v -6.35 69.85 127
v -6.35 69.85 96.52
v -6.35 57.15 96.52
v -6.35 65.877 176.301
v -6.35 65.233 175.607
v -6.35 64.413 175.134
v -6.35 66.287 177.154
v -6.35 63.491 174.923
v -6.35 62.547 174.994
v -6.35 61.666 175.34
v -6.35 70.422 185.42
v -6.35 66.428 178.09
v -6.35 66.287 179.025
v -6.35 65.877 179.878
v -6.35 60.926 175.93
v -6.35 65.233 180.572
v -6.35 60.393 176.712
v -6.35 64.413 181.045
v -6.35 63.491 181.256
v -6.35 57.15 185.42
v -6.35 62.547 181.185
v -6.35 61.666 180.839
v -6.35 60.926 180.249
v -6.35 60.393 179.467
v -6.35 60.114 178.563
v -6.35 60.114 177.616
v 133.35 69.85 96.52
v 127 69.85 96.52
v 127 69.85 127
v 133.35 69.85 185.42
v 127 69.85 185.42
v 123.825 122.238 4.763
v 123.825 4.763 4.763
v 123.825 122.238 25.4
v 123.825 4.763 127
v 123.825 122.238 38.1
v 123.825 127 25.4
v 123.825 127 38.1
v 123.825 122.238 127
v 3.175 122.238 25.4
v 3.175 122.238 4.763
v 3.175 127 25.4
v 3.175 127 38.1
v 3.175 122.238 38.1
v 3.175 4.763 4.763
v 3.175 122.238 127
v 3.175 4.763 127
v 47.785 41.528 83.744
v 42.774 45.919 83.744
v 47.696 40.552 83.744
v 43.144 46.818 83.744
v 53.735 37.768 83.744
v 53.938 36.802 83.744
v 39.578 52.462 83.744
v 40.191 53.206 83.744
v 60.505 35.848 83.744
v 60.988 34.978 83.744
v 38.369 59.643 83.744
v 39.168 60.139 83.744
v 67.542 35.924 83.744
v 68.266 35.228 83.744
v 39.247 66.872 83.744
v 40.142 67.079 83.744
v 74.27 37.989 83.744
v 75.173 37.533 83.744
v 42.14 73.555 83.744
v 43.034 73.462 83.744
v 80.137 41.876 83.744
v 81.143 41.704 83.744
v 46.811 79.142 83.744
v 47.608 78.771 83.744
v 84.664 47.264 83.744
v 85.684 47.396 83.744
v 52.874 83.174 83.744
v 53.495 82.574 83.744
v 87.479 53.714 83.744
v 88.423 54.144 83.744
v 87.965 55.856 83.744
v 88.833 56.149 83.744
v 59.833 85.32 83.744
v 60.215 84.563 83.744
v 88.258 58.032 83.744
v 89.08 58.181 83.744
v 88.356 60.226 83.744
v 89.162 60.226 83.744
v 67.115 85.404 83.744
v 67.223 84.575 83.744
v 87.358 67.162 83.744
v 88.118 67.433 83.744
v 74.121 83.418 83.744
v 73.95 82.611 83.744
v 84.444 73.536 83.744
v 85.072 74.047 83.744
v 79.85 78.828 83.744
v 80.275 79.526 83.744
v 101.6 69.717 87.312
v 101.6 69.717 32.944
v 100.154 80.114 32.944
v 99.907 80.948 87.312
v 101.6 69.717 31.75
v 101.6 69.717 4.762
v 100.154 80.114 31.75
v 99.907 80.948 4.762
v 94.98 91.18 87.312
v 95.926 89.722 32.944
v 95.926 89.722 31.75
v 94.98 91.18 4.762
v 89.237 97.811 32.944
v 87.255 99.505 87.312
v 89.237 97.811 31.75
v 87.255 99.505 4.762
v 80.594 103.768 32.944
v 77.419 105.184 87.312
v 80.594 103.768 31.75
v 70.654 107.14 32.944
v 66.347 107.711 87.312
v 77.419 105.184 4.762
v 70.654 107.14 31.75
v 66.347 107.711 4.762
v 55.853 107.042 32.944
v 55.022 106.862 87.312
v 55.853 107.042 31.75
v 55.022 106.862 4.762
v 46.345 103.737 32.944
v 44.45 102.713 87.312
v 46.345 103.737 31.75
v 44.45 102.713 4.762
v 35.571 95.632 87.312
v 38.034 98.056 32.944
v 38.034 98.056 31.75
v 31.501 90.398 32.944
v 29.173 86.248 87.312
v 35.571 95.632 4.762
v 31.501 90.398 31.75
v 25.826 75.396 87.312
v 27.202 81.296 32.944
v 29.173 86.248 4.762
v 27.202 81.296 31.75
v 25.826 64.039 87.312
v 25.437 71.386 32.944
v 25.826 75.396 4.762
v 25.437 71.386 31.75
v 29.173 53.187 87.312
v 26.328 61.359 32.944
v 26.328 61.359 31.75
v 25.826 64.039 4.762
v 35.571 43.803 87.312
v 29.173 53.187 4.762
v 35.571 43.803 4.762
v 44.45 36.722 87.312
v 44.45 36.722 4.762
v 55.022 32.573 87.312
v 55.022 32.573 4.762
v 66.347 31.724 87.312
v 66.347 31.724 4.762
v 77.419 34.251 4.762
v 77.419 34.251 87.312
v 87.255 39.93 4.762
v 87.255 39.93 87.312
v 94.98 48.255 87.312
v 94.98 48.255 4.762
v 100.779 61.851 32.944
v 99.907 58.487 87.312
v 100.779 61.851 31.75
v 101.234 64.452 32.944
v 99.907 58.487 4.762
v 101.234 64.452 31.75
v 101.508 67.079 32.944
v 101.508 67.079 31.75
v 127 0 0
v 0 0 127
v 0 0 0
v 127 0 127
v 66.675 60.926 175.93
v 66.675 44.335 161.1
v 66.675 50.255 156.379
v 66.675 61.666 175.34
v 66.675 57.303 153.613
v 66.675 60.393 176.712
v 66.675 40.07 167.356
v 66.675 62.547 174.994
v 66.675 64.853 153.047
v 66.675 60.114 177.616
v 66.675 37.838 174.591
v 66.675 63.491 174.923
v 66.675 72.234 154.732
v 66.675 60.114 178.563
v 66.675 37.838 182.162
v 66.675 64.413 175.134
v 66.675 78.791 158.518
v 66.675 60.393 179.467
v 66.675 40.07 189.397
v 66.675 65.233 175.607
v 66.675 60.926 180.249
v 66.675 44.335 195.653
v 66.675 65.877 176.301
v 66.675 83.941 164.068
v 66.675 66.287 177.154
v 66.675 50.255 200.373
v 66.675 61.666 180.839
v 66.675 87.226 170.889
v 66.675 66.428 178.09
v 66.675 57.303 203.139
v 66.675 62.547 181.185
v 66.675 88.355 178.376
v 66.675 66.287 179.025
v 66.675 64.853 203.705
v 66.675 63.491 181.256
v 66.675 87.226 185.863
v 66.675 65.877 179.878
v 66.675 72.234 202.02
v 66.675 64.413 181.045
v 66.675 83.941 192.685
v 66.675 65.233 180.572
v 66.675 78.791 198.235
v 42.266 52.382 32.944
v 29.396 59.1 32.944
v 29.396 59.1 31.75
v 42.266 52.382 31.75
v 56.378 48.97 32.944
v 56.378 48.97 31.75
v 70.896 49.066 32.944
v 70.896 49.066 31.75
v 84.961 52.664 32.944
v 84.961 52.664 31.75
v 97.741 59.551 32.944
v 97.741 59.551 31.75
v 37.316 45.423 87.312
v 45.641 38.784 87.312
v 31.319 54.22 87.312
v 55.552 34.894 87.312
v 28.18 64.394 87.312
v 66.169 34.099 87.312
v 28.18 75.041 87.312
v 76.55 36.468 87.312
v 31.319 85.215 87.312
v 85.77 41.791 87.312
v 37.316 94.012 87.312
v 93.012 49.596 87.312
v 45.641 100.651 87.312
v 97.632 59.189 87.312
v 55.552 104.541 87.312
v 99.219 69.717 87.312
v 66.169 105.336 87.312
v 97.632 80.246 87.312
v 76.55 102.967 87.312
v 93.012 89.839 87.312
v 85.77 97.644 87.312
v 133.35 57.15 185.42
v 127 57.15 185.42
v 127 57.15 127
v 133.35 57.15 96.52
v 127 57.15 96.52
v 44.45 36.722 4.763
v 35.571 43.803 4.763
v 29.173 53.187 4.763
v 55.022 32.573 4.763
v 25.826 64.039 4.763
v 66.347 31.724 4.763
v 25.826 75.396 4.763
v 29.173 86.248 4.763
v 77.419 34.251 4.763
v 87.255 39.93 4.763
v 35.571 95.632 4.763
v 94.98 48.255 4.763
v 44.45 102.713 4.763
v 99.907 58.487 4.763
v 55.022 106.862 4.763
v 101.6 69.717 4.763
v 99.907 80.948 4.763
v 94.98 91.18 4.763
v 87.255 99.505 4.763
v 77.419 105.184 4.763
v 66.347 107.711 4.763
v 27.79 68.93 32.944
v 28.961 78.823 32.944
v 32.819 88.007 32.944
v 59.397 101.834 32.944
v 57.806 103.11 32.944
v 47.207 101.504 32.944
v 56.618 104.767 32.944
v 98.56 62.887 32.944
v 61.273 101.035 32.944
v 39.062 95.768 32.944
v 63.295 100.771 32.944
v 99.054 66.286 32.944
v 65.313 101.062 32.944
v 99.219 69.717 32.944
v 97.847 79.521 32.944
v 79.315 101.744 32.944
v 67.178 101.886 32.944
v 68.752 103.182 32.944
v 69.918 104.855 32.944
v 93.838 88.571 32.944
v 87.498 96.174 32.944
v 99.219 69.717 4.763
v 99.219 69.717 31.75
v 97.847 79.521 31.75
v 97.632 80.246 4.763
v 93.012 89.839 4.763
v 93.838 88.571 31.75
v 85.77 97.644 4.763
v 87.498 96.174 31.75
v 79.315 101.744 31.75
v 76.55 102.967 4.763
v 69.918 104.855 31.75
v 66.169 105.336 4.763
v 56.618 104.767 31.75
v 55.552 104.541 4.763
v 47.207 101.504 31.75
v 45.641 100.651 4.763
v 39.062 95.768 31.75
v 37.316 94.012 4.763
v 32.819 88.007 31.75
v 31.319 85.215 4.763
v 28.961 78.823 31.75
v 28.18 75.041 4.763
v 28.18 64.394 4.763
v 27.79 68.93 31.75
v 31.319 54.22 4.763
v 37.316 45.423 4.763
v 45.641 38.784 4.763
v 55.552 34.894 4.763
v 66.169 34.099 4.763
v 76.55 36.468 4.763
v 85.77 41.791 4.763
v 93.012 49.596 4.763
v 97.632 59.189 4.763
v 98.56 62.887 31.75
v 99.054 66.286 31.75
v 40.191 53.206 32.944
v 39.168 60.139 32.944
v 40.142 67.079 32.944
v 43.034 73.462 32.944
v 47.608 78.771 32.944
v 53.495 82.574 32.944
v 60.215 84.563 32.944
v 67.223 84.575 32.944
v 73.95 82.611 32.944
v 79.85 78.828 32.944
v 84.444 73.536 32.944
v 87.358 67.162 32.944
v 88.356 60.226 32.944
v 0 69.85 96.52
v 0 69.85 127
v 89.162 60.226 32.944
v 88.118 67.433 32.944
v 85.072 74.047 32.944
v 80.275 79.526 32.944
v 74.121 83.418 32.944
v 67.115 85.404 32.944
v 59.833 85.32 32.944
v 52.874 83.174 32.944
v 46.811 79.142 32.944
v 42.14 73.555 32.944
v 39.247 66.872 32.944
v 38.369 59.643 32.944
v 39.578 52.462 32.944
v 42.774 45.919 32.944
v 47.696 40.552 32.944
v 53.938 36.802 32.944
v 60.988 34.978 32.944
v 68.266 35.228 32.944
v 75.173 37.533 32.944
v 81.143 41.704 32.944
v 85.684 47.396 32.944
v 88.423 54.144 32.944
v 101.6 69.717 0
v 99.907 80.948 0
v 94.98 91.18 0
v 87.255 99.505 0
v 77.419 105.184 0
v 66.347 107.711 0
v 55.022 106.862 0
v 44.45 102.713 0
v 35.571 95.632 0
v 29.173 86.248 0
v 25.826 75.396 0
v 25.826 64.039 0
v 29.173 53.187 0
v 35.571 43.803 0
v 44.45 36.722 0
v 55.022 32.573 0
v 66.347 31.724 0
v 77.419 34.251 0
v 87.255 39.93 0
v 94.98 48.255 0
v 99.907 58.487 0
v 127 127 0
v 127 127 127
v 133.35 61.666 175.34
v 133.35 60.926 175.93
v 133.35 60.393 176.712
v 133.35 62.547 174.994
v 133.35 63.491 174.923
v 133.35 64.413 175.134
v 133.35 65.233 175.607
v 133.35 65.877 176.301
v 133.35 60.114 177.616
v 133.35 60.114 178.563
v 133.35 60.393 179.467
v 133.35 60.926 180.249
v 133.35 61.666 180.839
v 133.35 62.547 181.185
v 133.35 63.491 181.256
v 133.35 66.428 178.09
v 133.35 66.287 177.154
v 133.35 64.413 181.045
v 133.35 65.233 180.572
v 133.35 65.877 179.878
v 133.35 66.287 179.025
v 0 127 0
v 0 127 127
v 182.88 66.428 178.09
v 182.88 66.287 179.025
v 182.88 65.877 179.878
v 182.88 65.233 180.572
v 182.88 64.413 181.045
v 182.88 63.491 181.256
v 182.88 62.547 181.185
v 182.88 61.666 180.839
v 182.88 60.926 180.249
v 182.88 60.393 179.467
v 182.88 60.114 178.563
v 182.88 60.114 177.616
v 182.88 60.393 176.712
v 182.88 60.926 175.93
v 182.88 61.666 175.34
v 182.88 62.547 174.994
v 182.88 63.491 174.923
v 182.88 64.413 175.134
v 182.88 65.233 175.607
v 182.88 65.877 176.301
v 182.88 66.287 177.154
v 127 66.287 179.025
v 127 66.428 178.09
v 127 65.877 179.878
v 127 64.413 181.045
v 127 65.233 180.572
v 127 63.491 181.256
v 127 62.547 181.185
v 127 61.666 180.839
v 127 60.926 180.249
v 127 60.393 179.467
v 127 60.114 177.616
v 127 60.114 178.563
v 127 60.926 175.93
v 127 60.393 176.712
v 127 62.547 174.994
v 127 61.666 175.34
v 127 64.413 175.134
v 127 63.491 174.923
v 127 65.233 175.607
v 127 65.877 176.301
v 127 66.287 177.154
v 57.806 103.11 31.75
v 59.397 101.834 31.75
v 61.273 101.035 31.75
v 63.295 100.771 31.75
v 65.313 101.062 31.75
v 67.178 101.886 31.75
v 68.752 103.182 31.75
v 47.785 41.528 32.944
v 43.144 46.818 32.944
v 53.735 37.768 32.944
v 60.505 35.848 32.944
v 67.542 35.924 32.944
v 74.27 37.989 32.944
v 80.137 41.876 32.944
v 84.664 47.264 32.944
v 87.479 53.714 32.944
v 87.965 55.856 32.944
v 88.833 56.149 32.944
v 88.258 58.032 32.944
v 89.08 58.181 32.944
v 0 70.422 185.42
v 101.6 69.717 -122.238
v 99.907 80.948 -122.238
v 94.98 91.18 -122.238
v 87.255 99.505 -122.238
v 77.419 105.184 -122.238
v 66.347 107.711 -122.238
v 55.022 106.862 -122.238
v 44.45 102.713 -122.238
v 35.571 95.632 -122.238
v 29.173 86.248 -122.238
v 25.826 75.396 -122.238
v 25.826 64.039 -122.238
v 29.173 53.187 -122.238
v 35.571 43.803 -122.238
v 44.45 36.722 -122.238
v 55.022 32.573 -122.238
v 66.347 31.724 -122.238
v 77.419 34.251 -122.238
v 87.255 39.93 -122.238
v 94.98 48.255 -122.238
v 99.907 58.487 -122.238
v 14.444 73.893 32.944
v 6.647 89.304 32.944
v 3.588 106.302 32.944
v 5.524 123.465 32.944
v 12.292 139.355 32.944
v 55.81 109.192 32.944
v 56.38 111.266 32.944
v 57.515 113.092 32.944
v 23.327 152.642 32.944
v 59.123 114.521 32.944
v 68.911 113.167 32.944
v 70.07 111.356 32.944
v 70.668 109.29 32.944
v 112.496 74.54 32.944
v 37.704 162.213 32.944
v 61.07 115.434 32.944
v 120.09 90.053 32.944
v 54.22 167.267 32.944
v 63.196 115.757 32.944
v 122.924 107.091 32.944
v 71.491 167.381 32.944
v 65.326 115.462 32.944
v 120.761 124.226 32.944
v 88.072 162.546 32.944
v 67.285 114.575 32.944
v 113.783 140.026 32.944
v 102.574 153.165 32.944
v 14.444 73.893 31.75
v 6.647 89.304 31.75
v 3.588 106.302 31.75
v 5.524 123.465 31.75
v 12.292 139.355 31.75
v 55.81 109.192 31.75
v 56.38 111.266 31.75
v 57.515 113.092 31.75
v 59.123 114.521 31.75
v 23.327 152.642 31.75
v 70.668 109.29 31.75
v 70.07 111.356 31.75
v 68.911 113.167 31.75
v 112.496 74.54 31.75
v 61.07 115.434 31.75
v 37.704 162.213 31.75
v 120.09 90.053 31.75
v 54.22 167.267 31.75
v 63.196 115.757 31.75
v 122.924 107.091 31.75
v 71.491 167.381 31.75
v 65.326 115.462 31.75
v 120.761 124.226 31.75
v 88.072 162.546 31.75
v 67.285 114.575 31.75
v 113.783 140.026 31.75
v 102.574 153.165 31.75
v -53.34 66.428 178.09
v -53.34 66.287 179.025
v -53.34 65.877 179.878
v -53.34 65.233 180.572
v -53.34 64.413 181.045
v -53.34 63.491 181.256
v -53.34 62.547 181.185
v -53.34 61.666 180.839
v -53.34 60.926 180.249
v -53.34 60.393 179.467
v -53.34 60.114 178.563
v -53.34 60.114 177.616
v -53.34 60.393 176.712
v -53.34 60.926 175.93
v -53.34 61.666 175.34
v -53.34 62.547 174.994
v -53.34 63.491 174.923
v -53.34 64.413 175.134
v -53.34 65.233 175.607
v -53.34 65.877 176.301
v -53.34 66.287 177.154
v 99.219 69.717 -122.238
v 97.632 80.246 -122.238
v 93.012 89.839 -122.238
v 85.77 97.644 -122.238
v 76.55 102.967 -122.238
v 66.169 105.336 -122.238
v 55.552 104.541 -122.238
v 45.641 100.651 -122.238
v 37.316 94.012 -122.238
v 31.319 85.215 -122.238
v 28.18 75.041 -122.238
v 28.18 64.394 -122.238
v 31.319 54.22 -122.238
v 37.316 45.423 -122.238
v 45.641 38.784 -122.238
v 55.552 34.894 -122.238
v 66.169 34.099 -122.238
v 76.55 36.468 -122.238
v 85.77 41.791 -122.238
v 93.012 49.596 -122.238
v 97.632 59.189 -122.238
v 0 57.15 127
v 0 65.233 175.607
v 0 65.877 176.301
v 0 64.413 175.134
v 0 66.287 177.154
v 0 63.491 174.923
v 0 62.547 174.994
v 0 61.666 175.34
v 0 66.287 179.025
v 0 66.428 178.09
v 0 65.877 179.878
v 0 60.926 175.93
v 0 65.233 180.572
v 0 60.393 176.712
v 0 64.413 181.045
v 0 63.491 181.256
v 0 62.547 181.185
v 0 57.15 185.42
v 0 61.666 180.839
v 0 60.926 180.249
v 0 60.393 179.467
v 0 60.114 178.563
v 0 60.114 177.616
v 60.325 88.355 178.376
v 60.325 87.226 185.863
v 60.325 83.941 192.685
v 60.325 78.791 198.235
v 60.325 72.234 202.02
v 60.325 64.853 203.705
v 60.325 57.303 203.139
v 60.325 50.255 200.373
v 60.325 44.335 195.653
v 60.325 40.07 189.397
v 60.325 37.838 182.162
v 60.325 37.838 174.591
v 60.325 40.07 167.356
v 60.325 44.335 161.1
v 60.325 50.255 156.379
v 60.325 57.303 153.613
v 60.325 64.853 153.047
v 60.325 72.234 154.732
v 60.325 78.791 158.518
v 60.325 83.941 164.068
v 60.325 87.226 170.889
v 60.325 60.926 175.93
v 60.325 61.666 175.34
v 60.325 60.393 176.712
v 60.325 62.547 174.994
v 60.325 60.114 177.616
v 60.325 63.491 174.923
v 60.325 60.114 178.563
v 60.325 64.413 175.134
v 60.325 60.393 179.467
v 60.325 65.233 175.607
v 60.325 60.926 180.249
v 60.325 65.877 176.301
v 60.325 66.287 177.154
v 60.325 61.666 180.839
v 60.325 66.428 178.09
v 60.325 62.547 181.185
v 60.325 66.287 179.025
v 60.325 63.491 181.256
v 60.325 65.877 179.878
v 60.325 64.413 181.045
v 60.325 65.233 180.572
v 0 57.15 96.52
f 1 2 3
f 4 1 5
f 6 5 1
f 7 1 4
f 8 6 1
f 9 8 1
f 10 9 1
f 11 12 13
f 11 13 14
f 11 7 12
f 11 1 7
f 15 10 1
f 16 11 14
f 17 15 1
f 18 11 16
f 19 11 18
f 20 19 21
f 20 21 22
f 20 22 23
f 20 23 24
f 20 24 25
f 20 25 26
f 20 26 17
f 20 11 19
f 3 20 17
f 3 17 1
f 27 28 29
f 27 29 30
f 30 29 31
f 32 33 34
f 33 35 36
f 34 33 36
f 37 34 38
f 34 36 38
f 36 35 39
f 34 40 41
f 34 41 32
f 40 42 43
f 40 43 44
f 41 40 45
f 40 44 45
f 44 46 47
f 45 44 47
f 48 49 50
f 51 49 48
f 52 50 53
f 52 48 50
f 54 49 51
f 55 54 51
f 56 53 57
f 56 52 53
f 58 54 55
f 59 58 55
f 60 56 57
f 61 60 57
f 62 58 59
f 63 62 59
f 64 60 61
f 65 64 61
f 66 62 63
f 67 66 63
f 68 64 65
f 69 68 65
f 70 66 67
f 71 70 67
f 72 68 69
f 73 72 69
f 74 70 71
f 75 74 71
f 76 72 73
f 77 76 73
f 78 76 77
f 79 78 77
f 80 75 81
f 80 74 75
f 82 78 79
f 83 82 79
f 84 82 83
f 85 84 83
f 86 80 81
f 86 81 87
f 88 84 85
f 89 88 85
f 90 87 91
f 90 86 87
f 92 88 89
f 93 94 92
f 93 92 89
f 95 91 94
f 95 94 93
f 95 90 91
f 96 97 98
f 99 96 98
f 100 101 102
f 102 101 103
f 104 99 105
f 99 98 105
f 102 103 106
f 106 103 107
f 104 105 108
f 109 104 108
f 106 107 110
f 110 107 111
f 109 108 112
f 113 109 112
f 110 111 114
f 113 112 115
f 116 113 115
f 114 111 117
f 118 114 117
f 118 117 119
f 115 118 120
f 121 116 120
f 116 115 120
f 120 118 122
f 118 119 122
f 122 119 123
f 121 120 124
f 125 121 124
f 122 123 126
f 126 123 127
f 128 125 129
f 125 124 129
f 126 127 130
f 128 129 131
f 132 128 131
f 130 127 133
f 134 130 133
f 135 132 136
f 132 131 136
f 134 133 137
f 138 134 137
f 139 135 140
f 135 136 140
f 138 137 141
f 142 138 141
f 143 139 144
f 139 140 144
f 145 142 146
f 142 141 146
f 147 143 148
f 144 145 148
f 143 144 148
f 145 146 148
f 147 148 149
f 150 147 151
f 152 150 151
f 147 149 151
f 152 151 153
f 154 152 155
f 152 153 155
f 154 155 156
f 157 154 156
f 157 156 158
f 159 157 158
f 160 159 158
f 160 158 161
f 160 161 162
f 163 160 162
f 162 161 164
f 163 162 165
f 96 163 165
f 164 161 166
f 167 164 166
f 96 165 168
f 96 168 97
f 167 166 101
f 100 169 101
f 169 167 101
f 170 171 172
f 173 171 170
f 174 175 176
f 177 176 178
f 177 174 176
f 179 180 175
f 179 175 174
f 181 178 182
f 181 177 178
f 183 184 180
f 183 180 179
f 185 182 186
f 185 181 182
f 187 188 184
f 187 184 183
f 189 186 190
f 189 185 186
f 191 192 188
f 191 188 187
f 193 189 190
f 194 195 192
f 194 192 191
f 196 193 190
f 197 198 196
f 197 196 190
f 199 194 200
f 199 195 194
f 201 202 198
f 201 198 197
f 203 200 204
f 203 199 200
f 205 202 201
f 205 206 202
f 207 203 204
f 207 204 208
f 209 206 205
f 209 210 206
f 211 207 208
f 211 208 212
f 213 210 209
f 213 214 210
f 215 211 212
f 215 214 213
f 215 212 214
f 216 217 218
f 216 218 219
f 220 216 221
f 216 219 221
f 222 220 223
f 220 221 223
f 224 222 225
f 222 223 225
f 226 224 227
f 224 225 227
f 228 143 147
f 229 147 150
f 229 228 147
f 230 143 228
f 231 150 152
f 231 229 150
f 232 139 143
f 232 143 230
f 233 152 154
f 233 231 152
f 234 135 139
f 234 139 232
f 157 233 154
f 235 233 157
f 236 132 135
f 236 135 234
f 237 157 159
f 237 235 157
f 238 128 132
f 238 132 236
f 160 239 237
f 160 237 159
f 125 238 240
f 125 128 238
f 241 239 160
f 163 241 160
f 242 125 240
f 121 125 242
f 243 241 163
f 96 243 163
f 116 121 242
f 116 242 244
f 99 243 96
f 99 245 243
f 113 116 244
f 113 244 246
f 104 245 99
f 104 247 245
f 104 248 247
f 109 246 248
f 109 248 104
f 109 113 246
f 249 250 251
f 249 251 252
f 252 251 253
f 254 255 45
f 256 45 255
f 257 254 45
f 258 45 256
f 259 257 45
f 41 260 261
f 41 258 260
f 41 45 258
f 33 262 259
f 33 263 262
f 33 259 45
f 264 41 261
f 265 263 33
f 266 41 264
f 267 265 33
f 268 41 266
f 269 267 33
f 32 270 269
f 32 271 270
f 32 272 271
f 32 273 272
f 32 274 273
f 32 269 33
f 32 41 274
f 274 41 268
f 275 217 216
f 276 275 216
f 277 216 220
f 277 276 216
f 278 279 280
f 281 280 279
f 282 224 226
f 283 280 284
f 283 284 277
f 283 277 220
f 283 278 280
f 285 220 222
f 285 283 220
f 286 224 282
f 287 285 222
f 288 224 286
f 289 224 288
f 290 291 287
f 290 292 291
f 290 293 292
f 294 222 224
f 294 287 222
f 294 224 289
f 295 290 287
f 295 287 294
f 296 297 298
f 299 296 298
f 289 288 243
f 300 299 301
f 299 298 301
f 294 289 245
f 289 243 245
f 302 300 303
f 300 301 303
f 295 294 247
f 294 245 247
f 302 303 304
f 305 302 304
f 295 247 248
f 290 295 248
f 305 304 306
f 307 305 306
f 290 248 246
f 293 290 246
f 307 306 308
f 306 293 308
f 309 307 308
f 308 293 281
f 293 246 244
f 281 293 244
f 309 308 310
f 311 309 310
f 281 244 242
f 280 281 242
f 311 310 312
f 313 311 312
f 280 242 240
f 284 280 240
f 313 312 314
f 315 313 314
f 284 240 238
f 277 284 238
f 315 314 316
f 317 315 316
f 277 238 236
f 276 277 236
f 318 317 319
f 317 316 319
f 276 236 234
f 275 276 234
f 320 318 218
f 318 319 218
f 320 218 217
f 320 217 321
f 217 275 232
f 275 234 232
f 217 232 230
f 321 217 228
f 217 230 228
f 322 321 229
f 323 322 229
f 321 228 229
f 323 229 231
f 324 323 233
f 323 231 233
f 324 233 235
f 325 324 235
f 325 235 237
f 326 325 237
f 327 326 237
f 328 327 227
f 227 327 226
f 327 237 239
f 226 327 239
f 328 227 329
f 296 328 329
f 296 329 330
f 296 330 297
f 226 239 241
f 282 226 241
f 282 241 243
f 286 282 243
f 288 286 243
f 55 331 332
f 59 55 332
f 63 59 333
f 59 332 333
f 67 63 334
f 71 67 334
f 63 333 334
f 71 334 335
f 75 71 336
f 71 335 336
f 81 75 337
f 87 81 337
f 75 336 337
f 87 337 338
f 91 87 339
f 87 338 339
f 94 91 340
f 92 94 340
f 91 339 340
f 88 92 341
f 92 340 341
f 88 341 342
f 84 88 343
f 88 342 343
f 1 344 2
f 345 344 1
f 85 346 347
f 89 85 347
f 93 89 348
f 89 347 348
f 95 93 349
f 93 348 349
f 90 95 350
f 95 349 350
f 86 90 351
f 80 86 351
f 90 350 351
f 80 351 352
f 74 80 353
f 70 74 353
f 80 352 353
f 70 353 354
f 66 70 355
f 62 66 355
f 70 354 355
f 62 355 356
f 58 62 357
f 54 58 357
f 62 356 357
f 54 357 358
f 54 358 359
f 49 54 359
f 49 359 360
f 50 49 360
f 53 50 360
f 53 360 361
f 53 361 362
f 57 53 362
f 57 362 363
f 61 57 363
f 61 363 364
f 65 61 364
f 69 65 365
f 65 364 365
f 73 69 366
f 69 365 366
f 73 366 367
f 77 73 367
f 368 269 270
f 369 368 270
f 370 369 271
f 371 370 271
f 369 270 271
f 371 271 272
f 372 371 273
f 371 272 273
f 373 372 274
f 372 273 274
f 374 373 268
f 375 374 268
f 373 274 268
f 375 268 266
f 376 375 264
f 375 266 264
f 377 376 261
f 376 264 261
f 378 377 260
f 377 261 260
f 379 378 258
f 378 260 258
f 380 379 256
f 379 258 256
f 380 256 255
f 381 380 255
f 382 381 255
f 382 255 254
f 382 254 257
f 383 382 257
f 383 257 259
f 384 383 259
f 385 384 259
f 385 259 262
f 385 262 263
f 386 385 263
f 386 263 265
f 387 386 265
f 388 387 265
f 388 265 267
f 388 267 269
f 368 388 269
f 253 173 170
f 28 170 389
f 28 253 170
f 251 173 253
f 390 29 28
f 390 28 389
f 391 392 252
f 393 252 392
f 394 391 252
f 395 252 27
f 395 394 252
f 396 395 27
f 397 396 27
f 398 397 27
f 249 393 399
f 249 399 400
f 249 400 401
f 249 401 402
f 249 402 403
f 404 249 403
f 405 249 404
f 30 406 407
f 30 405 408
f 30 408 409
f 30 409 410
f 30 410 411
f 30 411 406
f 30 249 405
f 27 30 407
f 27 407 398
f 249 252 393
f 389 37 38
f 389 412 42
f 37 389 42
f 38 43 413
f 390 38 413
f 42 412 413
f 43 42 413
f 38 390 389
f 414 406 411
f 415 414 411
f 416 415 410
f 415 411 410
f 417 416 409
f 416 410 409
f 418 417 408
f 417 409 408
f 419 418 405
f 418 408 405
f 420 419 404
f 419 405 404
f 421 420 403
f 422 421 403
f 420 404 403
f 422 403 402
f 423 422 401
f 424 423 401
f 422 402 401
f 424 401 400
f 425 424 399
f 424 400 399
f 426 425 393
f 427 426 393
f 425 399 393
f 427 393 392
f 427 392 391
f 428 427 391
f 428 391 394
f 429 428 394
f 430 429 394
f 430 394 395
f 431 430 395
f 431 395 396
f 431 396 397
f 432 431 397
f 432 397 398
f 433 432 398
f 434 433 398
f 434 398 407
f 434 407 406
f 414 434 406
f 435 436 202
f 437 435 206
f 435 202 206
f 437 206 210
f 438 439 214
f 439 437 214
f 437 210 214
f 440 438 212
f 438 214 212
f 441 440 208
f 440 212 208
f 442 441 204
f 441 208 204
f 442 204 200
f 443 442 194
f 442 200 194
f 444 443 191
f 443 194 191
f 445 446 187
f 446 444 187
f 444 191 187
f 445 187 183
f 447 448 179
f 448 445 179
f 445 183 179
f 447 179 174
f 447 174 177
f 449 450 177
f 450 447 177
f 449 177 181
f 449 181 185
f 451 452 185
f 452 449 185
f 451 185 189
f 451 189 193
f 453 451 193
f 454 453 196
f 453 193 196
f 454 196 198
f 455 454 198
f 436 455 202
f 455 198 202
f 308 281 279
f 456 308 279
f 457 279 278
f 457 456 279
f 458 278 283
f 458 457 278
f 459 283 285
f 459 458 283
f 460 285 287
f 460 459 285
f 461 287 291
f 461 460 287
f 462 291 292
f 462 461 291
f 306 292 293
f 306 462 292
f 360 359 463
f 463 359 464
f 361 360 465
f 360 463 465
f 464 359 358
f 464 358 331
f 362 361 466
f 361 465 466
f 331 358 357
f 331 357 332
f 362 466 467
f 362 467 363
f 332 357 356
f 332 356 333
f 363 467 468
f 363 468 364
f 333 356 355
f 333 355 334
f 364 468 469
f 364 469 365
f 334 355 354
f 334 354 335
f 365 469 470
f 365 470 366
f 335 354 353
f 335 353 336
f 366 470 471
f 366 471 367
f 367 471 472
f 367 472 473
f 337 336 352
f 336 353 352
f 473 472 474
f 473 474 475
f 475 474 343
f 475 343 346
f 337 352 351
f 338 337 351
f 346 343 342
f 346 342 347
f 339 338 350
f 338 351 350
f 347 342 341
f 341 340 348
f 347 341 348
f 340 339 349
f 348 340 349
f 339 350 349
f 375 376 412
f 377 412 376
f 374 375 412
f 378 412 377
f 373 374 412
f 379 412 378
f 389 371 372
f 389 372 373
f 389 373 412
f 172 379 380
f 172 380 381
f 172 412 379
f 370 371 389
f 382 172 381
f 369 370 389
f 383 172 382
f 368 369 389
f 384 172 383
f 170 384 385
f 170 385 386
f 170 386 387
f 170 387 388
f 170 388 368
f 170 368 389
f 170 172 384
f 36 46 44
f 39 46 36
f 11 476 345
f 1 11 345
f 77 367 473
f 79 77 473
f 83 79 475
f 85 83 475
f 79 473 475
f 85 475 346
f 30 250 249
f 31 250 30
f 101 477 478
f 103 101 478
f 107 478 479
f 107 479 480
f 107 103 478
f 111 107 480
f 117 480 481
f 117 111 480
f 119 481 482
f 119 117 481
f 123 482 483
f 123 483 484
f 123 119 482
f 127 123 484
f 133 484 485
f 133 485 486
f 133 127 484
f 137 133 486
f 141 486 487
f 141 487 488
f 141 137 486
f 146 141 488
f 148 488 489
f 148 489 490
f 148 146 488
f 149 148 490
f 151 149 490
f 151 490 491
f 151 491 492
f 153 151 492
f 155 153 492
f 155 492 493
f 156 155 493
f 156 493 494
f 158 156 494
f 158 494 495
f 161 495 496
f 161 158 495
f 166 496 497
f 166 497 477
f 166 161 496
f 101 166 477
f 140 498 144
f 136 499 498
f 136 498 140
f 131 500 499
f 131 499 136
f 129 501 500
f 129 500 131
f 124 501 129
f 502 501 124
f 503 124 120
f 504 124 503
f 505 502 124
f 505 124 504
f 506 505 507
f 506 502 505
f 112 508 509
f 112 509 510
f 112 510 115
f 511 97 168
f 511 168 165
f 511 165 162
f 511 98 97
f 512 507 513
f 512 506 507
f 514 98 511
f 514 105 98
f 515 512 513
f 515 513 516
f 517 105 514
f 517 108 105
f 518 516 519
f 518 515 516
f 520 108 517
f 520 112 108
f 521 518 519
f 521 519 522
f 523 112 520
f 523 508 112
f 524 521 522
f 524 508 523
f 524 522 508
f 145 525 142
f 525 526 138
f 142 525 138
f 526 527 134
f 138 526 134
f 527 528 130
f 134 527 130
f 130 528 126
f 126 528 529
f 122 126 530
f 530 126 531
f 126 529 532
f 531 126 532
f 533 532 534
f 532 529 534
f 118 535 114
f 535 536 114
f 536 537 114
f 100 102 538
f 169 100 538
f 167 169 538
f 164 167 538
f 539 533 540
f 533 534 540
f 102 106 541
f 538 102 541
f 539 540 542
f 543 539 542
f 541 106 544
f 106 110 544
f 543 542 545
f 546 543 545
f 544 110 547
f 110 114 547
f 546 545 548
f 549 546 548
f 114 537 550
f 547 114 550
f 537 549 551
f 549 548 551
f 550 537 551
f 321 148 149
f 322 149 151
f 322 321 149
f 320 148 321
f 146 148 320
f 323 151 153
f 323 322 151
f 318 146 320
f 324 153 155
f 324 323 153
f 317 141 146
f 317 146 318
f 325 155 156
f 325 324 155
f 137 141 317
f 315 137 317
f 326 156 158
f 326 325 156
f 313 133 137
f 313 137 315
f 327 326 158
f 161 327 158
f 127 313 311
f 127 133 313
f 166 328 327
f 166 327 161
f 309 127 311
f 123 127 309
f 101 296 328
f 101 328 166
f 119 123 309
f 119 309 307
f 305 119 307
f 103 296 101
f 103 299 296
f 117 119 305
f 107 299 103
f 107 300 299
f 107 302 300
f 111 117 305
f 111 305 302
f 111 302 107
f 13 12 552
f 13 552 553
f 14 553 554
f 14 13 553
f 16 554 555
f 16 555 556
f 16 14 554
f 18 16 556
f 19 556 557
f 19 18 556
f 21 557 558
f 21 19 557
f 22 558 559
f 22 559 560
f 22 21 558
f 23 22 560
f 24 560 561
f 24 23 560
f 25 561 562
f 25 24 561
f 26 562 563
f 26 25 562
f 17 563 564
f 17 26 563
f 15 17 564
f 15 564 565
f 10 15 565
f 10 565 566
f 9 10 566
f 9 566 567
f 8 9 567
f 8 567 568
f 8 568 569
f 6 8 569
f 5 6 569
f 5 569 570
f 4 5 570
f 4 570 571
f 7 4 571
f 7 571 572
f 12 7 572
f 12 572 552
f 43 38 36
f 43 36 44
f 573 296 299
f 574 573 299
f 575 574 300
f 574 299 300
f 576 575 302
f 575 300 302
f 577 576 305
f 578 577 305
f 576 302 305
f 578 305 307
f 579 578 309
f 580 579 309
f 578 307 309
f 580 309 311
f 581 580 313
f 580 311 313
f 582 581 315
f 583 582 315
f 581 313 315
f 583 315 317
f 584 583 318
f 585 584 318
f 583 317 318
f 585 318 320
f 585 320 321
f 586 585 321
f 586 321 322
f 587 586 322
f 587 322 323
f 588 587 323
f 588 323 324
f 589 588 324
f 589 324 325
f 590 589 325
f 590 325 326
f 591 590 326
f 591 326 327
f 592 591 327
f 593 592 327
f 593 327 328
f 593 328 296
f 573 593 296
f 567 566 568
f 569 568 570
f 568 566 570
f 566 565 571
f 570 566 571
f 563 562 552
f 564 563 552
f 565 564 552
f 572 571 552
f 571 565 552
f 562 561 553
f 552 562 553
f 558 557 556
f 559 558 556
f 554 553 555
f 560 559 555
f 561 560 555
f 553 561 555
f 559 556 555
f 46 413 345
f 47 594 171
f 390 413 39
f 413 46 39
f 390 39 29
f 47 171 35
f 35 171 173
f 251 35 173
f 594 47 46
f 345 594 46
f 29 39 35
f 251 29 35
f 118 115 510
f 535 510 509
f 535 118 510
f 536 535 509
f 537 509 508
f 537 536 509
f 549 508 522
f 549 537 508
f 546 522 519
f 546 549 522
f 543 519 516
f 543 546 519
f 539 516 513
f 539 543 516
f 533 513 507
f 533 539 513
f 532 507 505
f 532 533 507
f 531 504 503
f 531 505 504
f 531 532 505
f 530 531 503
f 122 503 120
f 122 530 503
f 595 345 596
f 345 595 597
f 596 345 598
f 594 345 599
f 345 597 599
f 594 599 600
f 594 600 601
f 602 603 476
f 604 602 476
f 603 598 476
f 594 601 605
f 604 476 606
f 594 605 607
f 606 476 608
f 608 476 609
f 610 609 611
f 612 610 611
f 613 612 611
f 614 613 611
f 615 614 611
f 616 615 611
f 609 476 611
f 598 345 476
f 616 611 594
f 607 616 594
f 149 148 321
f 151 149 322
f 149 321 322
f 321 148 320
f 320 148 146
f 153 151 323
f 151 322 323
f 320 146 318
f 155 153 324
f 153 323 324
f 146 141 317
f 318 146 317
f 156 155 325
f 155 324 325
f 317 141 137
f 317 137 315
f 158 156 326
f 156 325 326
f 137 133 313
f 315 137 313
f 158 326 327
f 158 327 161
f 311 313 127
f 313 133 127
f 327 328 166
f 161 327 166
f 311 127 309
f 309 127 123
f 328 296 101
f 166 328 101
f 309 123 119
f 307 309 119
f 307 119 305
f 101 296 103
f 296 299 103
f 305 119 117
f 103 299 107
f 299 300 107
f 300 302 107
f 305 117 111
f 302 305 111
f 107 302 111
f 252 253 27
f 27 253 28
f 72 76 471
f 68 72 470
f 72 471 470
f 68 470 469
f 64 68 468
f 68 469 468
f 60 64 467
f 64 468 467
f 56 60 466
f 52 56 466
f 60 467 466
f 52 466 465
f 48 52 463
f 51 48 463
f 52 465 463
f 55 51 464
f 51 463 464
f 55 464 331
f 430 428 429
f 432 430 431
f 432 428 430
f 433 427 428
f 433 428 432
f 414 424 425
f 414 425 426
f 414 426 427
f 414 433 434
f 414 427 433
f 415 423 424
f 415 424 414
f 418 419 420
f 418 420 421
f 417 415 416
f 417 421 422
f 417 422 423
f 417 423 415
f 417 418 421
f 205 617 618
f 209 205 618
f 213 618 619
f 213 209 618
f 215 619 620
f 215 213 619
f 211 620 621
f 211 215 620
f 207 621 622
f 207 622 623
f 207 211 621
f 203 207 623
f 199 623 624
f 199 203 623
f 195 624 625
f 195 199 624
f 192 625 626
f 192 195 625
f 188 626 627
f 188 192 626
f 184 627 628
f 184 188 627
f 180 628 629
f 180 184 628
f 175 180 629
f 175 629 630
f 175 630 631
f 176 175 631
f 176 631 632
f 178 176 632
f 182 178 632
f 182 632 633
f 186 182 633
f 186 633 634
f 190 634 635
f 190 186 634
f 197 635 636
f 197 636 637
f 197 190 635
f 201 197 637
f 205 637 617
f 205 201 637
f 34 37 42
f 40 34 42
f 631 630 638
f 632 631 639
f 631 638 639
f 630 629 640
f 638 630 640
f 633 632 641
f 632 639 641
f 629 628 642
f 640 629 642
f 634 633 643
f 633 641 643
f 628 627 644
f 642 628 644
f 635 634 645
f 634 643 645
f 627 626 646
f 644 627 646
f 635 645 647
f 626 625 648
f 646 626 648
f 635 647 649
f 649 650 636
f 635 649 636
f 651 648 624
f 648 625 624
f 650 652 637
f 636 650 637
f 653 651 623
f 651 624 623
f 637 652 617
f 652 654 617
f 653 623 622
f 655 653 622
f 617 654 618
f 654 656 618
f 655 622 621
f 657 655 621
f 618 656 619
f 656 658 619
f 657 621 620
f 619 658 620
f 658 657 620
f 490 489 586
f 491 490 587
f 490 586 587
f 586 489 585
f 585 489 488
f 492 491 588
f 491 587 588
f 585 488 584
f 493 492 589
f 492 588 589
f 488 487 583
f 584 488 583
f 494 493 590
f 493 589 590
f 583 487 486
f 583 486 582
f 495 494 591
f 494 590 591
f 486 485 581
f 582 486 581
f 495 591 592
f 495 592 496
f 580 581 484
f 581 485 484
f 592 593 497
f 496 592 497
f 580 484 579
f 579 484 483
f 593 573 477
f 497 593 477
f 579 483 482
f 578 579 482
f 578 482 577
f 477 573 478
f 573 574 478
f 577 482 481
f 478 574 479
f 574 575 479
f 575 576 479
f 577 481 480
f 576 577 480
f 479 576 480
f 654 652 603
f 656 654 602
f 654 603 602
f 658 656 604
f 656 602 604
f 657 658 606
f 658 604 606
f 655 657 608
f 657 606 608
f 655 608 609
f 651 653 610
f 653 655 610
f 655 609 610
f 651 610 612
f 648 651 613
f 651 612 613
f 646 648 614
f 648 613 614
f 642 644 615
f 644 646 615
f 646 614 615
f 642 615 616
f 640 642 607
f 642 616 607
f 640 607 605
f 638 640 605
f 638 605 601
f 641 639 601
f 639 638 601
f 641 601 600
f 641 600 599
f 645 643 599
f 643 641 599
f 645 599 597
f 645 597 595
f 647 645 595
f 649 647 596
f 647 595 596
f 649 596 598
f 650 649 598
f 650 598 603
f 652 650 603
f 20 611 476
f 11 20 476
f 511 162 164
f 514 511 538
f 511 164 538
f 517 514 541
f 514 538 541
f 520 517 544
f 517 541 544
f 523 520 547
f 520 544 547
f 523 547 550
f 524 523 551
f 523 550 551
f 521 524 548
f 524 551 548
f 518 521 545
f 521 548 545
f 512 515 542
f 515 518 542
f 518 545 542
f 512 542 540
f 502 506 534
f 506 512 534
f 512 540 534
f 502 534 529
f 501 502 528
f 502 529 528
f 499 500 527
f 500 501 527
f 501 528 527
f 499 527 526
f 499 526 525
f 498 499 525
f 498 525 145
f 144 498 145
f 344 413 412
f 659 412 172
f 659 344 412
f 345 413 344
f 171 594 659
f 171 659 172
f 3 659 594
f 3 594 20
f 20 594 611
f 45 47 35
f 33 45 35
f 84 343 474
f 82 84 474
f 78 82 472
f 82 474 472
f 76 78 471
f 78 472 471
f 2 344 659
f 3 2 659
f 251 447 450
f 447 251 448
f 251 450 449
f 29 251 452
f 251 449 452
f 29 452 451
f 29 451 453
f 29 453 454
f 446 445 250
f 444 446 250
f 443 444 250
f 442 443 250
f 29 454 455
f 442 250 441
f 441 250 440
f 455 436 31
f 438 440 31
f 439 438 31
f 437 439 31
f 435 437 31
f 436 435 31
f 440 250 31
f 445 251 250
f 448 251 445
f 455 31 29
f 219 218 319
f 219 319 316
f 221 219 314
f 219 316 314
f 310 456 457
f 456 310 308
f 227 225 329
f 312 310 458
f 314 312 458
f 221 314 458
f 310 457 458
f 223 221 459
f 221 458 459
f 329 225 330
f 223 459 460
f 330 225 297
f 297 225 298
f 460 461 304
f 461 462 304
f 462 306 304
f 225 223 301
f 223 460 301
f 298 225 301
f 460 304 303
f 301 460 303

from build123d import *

# Parameters (mm, degrees)
F0_W      = 127
F0_H      = 127
F1_DEPTH  = 127
F2_W      = 120.65
F2_H      = 117.475
F3_DEPTH  = 122.2375
F4_R      = 38.1
F5_DEPTH  = 258.318
F6_R      = 38.1
F7_DEPTH  = 82.55
F9_DEPTH  = 127
F8_R      = 35.71875
F10_DEPTH = 222.25
F11_R     = 35.71875
F12_DEPTH = 181.61
F13_W     = 127
F13_H     = 12.7
F14_DEPTH = 4.7625
F15_W     = 4.7625
F15_H     = 12.7
F16_DEPTH = 3.175
F17_W     = 4.7625
F17_H     = 12.7
F18_DEPTH = 3.175
F21_R     = 59.69
F21_R_2   = 7.493
F22_DEPTH = 1.1938
F24_DEPTH = 50.8
F25_W     = 12.7
F25_H     = 30.48
F25_H_2   = 58.42
F26_DEPTH = 6.35
F27_W     = 12.7
F27_H     = 30.48
F28_DEPTH = 6.35
F29_R     = 3.175
F30_DEPTH = 182.88
F33_R     = 25.4
F34_DEPTH = 3.175


# Not quite as in the source:
# - a feature of the source that left no trace in its solid (it failed there, or was rolled back) is left out
# - a pattern or mirror of a feature is missing from the dataset's text; its kind, count and spacing are read off the source's solid


with BuildPart() as f1:
    # F0 (on Front) → F1 (new body)
    with BuildSketch(Plane.XZ):
        with Locations((63.5, 63.5)):
            Rectangle(F0_W, F0_H)
    extrude(amount=-F1_DEPTH)

    # F2 (on face) → F3 (cut)
    with BuildSketch(Plane.XY.offset(127)):
        with Locations((63.5, 63.5)):
            Rectangle(F2_W, F2_H)
    extrude(amount=-F3_DEPTH, mode=Mode.SUBTRACT)

    # F4 (on face) → F5 (cut)
    with BuildSketch(Plane.XY.offset(127)):
        with Locations((63.5, 69.7174778593)):
            Circle(F4_R)
    extrude(amount=-F5_DEPTH, mode=Mode.SUBTRACT)

    # F11 (on face) → F12 (cut)
    with BuildSketch(Plane.XY.offset(4.7625)):
        with Locations((63.5, 69.7174778593)):
            Circle(F11_R)
    extrude(amount=-F12_DEPTH, mode=Mode.SUBTRACT)

    # F13 (on face) → F14 (cut)
    with BuildSketch(Plane(origin=(0, 127, 0), x_dir=(-1, 0, 0), z_dir=(0, 1, 0))):
        with Locations((-63.5, 31.75)):
            Rectangle(F13_W, F13_H)
    extrude(amount=-F14_DEPTH, mode=Mode.SUBTRACT)

    # F15 (on face) → F16 (join)
    with BuildSketch(Plane.YZ.offset(127)):
        with Locations((124.61875, 31.75)):
            Rectangle(F15_W, F15_H)
    extrude(amount=-F16_DEPTH)

    # F17 (on face) → F18 (join)
    with BuildSketch(Plane(origin=(0, 0, 0), x_dir=(0, -1, 0), z_dir=(-1, 0, 0))):
        with Locations((-124.61875, 31.75)):
            Rectangle(F17_W, F17_H)
    extrude(amount=-F18_DEPTH)

    # F25 (on face) → F26 (join)
    with BuildSketch(Plane.YZ.offset(127)):
        with Locations((63.5, 111.76)):
            Rectangle(F25_W, F25_H)
        with Locations((63.5, 156.21)):
            Rectangle(F25_W, F25_H_2)
    extrude(amount=F26_DEPTH)

    # F27 (on face) → F28 (join)
    with BuildSketch(Plane(origin=(0, 0, 0), x_dir=(0, -1, 0), z_dir=(-1, 0, 0))):
        Polygon((-70.4222992063, 185.42), (-69.85, 127), (-57.15, 127), (-57.15, 185.42), align=None)
        with Locations((-63.5, 111.76)):
            Rectangle(F27_W, F27_H)
    extrude(amount=F28_DEPTH)

    # F29 (on Right) → F30 (join)
    with BuildSketch(Plane.YZ):
        with Locations((63.2532713579, 178.0895883254)):
            Circle(F29_R)
    f30 = extrude(amount=F30_DEPTH)

    # F30_copies: F30 across plane
    add(f30.mirror(Plane(origin=(64.77, 0, 0), x_dir=(0, 0, -1), z_dir=(-1, 0, 0))))

    # F33 (on offset) → F34 (join, symmetric)
    with BuildSketch(Plane.YZ.offset(63.5)):
        with Locations((62.9547689138, 178.3762046341)):
            Circle(F33_R)
    extrude(amount=F34_DEPTH, both=True)


with BuildPart() as f7:
    # F6 (on face) → F7 (new body)
    with BuildSketch(Plane.XY.offset(4.7625)):
        with Locations((63.5, 69.7174778593)):
            Circle(F6_R)
    extrude(amount=F7_DEPTH)


with BuildPart() as f9:
    # F9 (new): a face of the model
    f9_faces = [f7.part.faces().sort_by_distance(p)[0] for p in [
        (63.5, 69.7174778593, 4.7625),
    ]]
    extrude(f9_faces, amount=F9_DEPTH)


with BuildPart() as f10_tool:
    # F8 (on face) → F10 (new body)
    with BuildSketch(Plane.XY.offset(87.3125)):
        with Locations((63.5, 69.7174778593)):
            Circle(F8_R)
    extrude(amount=-F10_DEPTH)


with BuildPart() as f7_1:
    add(f7.part)

    # F10: cut by f10_tool
    add(f10_tool.part, mode=Mode.SUBTRACT)

    # F21 (on plane+point) → F22 (join)
    with BuildSketch(Plane.XY.offset(31.75)):
        with Locations((63.245382659, 108.263690491)):
            Circle(F21_R)
        with Locations((63.245382659, 108.263690491)):
            Circle(F21_R_2, mode=Mode.SUBTRACT)
    extrude(amount=F22_DEPTH)


with BuildPart() as f9_1:
    add(f9.part)

    # F10: cut by f10_tool
    add(f10_tool.part, mode=Mode.SUBTRACT)


with BuildPart() as f24:
    # F23 (on face) → F24 (new body)
    with BuildSketch(Plane.XY.offset(32.9438)):
        with BuildLine():
            ThreePointArc((88.4231645198, 54.143681247), (88.9766971884, 57.1623882847), (89.1621103891, 60.2258197822))
            ThreePointArc((89.1621103891, 60.2258197822), (60.4276466966, 85.4059975394), (39.2375944927, 53.6146080892))
            ThreePointArc((39.2375944927, 53.6146080892), (39.7134324698, 53.4080306163), (40.1910477523, 53.205596245))
            ThreePointArc((40.1910477523, 53.205596245), (60.2149104685, 84.5629499553), (88.3563888363, 60.2258197822))
            ThreePointArc((88.3563888363, 60.2258197822), (88.1359865749, 56.9405964992), (87.4787300717, 53.7142544428))
            ThreePointArc((87.4787300717, 53.7142544428), (87.9518803037, 53.9269158892), (88.4231645198, 54.143681247))
        make_face()
        with BuildLine():
            ThreePointArc((40.1910477523, 53.205596245), (39.7134324698, 53.4080306163), (39.2375944927, 53.6146080892))
            ThreePointArc((39.2375944927, 53.6146080892), (64.0353141115, 34.8272891214), (88.4231645198, 54.143681247))
            ThreePointArc((88.4231645198, 54.143681247), (87.9518803037, 53.9269158892), (87.4787300717, 53.7142544428))
            ThreePointArc((87.4787300717, 53.7142544428), (64.0266477285, 35.6329640648), (40.1910477523, 53.205596245))
        make_face()
    extrude(amount=F24_DEPTH)


solid = Compound([f1.part, f7_1.part, f9_1.part, f24.part])
